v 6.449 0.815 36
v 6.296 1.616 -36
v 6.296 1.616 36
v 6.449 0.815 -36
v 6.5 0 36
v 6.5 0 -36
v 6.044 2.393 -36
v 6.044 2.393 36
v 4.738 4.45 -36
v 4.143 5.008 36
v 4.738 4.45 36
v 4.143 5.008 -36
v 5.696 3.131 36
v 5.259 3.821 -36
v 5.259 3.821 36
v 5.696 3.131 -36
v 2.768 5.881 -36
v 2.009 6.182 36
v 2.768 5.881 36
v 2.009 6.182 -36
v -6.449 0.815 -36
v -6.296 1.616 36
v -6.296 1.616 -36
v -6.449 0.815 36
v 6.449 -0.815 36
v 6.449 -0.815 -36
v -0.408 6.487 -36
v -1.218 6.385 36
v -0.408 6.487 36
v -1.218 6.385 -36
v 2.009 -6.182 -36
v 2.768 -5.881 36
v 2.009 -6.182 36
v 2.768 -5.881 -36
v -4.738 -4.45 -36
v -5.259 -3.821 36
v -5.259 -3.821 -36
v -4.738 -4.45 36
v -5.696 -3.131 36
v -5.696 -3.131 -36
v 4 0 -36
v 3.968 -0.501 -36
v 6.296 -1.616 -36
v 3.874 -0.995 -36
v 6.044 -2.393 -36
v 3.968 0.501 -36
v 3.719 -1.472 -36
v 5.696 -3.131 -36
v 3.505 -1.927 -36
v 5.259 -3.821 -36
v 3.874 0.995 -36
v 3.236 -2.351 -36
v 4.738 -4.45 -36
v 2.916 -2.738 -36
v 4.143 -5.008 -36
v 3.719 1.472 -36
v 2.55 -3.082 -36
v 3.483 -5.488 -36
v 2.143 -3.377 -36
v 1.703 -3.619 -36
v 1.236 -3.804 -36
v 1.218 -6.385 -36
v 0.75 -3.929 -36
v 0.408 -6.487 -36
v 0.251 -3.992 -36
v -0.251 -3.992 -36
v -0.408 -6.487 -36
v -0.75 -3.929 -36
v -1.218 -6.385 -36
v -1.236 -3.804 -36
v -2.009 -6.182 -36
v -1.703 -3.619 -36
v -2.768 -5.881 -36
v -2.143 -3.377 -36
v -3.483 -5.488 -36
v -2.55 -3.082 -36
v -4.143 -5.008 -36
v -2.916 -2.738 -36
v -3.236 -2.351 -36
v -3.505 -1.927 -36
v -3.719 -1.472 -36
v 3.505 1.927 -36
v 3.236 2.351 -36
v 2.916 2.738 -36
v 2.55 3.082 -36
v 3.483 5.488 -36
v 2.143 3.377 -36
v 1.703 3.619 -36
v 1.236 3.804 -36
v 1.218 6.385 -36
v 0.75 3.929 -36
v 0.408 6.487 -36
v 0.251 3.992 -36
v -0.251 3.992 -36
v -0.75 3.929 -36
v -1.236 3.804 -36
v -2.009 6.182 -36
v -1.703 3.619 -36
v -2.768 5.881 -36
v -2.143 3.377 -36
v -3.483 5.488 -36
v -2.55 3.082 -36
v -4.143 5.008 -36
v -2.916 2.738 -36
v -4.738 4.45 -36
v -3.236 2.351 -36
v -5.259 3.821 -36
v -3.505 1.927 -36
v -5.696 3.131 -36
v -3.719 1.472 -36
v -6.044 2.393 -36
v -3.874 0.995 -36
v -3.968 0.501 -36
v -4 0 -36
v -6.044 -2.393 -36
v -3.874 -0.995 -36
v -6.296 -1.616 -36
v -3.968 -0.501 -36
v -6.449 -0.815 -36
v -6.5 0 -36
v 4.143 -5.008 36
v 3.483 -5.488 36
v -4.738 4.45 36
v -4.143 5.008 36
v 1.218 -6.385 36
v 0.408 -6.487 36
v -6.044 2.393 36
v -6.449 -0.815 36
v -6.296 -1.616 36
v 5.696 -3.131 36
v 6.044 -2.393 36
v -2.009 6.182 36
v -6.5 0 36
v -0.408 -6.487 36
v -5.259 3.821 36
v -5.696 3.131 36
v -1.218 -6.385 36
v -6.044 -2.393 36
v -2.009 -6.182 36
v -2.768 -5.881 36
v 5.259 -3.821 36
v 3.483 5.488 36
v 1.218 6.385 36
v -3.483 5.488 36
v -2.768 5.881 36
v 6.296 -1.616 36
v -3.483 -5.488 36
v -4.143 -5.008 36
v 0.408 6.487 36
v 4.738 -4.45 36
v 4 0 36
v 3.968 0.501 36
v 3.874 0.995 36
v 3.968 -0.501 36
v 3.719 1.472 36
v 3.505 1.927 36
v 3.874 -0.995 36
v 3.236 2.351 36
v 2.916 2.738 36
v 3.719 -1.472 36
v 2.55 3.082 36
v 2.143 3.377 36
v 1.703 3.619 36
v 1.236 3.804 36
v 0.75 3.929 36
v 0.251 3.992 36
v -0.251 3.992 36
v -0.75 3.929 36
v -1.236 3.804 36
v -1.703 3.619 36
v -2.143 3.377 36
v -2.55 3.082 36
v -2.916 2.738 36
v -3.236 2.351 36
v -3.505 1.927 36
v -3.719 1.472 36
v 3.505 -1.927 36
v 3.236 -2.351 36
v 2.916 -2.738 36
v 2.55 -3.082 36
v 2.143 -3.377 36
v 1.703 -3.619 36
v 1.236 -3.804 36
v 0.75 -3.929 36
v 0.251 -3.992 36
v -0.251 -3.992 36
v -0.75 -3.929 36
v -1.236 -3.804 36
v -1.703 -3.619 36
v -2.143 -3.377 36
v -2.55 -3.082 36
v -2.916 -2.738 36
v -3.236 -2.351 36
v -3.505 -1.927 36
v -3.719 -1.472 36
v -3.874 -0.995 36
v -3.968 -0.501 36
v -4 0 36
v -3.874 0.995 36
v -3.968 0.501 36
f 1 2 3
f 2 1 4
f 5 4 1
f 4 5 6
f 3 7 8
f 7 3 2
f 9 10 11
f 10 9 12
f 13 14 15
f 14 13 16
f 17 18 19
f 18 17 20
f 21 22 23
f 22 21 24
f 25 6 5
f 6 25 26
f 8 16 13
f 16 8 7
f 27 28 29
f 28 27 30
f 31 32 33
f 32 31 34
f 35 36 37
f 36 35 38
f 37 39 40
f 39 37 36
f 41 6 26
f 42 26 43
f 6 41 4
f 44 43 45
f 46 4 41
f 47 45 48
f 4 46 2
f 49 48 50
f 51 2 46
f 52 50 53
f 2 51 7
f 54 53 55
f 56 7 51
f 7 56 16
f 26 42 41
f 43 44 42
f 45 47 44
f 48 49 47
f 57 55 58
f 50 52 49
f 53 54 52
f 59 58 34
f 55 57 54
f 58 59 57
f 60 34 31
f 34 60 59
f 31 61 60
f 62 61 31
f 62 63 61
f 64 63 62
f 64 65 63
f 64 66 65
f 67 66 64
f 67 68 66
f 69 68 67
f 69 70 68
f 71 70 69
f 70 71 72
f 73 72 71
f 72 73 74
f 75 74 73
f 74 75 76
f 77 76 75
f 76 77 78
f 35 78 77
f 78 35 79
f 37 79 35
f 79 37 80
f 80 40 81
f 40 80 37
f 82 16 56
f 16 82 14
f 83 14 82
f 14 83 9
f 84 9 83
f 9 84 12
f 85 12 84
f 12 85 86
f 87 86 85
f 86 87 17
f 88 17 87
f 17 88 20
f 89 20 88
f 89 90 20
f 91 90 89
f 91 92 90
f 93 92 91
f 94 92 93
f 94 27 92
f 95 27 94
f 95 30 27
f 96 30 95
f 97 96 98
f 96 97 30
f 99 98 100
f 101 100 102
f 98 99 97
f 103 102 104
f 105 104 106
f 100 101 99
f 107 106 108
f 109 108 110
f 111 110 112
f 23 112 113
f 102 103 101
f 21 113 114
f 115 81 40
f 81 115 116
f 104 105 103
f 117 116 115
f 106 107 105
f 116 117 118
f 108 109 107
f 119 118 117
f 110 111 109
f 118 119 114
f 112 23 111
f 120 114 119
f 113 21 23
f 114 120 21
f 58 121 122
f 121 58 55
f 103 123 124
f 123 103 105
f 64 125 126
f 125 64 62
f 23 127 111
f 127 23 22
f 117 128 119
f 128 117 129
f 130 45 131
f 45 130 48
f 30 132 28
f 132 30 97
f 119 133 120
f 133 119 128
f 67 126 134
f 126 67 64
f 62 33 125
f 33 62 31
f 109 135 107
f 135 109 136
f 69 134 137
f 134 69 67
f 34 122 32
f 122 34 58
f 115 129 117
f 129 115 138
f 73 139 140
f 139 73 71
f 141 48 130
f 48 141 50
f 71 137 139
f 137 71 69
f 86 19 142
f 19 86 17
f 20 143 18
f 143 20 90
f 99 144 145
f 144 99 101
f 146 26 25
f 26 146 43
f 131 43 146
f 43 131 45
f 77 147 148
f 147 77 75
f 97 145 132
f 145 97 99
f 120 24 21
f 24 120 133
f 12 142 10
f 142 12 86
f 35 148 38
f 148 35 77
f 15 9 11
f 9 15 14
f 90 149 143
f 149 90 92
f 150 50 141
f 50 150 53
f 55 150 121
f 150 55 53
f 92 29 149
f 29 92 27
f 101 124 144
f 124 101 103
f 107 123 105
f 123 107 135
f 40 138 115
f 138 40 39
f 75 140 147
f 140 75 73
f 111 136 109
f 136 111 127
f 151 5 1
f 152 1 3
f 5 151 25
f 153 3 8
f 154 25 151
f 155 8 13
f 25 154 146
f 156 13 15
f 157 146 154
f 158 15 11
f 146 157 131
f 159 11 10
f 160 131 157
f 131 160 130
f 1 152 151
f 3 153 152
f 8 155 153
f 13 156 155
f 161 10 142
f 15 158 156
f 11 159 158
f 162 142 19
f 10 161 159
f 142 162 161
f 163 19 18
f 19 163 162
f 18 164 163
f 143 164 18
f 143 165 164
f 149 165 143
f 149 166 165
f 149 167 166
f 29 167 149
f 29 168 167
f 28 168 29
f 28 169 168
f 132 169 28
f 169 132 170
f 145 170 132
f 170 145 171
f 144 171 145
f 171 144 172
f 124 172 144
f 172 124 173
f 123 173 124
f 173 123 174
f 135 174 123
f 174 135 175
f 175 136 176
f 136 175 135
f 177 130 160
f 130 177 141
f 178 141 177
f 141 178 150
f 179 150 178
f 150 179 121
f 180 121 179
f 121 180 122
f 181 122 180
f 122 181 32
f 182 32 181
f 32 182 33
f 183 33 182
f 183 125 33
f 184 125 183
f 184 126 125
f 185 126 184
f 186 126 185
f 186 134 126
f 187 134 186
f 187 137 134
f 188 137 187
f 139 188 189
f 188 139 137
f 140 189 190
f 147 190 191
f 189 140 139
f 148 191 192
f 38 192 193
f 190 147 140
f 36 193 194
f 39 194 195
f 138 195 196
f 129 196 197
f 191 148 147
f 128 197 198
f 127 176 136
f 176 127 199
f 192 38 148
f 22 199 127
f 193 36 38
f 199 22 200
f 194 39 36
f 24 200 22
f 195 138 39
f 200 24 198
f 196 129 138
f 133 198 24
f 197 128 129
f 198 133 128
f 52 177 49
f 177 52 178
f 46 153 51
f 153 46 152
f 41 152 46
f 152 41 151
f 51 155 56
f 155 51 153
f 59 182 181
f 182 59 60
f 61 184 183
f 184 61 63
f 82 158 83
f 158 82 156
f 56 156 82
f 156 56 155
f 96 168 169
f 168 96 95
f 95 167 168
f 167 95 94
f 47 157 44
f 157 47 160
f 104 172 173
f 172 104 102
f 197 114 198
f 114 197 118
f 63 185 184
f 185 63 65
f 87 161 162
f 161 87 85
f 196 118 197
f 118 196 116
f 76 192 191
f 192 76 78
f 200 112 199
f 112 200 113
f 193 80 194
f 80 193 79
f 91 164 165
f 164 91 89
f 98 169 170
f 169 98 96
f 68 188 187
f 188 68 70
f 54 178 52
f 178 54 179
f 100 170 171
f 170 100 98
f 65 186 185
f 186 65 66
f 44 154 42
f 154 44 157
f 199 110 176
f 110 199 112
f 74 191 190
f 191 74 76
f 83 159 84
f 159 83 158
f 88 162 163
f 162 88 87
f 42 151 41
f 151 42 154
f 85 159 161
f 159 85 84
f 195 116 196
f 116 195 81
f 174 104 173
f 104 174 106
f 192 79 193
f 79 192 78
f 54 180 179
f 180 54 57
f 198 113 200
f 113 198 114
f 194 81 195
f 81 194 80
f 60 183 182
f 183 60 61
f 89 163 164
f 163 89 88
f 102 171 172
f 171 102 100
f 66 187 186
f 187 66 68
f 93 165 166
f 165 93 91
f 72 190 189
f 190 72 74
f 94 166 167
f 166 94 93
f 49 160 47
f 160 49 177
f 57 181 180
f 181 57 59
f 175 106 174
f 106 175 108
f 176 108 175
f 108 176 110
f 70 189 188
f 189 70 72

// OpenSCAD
$fn = 50;


difference() {
	union() {
		translate(v = [0, 0, -36.0000000000]) {
			cylinder(h = 72, r = 6.5000000000);
		}
	}
	union() {
		translate(v = [0, 0, -100.0000000000]) {
			cylinder(h = 200, r = 4.0000000000);
		}
	}
}
